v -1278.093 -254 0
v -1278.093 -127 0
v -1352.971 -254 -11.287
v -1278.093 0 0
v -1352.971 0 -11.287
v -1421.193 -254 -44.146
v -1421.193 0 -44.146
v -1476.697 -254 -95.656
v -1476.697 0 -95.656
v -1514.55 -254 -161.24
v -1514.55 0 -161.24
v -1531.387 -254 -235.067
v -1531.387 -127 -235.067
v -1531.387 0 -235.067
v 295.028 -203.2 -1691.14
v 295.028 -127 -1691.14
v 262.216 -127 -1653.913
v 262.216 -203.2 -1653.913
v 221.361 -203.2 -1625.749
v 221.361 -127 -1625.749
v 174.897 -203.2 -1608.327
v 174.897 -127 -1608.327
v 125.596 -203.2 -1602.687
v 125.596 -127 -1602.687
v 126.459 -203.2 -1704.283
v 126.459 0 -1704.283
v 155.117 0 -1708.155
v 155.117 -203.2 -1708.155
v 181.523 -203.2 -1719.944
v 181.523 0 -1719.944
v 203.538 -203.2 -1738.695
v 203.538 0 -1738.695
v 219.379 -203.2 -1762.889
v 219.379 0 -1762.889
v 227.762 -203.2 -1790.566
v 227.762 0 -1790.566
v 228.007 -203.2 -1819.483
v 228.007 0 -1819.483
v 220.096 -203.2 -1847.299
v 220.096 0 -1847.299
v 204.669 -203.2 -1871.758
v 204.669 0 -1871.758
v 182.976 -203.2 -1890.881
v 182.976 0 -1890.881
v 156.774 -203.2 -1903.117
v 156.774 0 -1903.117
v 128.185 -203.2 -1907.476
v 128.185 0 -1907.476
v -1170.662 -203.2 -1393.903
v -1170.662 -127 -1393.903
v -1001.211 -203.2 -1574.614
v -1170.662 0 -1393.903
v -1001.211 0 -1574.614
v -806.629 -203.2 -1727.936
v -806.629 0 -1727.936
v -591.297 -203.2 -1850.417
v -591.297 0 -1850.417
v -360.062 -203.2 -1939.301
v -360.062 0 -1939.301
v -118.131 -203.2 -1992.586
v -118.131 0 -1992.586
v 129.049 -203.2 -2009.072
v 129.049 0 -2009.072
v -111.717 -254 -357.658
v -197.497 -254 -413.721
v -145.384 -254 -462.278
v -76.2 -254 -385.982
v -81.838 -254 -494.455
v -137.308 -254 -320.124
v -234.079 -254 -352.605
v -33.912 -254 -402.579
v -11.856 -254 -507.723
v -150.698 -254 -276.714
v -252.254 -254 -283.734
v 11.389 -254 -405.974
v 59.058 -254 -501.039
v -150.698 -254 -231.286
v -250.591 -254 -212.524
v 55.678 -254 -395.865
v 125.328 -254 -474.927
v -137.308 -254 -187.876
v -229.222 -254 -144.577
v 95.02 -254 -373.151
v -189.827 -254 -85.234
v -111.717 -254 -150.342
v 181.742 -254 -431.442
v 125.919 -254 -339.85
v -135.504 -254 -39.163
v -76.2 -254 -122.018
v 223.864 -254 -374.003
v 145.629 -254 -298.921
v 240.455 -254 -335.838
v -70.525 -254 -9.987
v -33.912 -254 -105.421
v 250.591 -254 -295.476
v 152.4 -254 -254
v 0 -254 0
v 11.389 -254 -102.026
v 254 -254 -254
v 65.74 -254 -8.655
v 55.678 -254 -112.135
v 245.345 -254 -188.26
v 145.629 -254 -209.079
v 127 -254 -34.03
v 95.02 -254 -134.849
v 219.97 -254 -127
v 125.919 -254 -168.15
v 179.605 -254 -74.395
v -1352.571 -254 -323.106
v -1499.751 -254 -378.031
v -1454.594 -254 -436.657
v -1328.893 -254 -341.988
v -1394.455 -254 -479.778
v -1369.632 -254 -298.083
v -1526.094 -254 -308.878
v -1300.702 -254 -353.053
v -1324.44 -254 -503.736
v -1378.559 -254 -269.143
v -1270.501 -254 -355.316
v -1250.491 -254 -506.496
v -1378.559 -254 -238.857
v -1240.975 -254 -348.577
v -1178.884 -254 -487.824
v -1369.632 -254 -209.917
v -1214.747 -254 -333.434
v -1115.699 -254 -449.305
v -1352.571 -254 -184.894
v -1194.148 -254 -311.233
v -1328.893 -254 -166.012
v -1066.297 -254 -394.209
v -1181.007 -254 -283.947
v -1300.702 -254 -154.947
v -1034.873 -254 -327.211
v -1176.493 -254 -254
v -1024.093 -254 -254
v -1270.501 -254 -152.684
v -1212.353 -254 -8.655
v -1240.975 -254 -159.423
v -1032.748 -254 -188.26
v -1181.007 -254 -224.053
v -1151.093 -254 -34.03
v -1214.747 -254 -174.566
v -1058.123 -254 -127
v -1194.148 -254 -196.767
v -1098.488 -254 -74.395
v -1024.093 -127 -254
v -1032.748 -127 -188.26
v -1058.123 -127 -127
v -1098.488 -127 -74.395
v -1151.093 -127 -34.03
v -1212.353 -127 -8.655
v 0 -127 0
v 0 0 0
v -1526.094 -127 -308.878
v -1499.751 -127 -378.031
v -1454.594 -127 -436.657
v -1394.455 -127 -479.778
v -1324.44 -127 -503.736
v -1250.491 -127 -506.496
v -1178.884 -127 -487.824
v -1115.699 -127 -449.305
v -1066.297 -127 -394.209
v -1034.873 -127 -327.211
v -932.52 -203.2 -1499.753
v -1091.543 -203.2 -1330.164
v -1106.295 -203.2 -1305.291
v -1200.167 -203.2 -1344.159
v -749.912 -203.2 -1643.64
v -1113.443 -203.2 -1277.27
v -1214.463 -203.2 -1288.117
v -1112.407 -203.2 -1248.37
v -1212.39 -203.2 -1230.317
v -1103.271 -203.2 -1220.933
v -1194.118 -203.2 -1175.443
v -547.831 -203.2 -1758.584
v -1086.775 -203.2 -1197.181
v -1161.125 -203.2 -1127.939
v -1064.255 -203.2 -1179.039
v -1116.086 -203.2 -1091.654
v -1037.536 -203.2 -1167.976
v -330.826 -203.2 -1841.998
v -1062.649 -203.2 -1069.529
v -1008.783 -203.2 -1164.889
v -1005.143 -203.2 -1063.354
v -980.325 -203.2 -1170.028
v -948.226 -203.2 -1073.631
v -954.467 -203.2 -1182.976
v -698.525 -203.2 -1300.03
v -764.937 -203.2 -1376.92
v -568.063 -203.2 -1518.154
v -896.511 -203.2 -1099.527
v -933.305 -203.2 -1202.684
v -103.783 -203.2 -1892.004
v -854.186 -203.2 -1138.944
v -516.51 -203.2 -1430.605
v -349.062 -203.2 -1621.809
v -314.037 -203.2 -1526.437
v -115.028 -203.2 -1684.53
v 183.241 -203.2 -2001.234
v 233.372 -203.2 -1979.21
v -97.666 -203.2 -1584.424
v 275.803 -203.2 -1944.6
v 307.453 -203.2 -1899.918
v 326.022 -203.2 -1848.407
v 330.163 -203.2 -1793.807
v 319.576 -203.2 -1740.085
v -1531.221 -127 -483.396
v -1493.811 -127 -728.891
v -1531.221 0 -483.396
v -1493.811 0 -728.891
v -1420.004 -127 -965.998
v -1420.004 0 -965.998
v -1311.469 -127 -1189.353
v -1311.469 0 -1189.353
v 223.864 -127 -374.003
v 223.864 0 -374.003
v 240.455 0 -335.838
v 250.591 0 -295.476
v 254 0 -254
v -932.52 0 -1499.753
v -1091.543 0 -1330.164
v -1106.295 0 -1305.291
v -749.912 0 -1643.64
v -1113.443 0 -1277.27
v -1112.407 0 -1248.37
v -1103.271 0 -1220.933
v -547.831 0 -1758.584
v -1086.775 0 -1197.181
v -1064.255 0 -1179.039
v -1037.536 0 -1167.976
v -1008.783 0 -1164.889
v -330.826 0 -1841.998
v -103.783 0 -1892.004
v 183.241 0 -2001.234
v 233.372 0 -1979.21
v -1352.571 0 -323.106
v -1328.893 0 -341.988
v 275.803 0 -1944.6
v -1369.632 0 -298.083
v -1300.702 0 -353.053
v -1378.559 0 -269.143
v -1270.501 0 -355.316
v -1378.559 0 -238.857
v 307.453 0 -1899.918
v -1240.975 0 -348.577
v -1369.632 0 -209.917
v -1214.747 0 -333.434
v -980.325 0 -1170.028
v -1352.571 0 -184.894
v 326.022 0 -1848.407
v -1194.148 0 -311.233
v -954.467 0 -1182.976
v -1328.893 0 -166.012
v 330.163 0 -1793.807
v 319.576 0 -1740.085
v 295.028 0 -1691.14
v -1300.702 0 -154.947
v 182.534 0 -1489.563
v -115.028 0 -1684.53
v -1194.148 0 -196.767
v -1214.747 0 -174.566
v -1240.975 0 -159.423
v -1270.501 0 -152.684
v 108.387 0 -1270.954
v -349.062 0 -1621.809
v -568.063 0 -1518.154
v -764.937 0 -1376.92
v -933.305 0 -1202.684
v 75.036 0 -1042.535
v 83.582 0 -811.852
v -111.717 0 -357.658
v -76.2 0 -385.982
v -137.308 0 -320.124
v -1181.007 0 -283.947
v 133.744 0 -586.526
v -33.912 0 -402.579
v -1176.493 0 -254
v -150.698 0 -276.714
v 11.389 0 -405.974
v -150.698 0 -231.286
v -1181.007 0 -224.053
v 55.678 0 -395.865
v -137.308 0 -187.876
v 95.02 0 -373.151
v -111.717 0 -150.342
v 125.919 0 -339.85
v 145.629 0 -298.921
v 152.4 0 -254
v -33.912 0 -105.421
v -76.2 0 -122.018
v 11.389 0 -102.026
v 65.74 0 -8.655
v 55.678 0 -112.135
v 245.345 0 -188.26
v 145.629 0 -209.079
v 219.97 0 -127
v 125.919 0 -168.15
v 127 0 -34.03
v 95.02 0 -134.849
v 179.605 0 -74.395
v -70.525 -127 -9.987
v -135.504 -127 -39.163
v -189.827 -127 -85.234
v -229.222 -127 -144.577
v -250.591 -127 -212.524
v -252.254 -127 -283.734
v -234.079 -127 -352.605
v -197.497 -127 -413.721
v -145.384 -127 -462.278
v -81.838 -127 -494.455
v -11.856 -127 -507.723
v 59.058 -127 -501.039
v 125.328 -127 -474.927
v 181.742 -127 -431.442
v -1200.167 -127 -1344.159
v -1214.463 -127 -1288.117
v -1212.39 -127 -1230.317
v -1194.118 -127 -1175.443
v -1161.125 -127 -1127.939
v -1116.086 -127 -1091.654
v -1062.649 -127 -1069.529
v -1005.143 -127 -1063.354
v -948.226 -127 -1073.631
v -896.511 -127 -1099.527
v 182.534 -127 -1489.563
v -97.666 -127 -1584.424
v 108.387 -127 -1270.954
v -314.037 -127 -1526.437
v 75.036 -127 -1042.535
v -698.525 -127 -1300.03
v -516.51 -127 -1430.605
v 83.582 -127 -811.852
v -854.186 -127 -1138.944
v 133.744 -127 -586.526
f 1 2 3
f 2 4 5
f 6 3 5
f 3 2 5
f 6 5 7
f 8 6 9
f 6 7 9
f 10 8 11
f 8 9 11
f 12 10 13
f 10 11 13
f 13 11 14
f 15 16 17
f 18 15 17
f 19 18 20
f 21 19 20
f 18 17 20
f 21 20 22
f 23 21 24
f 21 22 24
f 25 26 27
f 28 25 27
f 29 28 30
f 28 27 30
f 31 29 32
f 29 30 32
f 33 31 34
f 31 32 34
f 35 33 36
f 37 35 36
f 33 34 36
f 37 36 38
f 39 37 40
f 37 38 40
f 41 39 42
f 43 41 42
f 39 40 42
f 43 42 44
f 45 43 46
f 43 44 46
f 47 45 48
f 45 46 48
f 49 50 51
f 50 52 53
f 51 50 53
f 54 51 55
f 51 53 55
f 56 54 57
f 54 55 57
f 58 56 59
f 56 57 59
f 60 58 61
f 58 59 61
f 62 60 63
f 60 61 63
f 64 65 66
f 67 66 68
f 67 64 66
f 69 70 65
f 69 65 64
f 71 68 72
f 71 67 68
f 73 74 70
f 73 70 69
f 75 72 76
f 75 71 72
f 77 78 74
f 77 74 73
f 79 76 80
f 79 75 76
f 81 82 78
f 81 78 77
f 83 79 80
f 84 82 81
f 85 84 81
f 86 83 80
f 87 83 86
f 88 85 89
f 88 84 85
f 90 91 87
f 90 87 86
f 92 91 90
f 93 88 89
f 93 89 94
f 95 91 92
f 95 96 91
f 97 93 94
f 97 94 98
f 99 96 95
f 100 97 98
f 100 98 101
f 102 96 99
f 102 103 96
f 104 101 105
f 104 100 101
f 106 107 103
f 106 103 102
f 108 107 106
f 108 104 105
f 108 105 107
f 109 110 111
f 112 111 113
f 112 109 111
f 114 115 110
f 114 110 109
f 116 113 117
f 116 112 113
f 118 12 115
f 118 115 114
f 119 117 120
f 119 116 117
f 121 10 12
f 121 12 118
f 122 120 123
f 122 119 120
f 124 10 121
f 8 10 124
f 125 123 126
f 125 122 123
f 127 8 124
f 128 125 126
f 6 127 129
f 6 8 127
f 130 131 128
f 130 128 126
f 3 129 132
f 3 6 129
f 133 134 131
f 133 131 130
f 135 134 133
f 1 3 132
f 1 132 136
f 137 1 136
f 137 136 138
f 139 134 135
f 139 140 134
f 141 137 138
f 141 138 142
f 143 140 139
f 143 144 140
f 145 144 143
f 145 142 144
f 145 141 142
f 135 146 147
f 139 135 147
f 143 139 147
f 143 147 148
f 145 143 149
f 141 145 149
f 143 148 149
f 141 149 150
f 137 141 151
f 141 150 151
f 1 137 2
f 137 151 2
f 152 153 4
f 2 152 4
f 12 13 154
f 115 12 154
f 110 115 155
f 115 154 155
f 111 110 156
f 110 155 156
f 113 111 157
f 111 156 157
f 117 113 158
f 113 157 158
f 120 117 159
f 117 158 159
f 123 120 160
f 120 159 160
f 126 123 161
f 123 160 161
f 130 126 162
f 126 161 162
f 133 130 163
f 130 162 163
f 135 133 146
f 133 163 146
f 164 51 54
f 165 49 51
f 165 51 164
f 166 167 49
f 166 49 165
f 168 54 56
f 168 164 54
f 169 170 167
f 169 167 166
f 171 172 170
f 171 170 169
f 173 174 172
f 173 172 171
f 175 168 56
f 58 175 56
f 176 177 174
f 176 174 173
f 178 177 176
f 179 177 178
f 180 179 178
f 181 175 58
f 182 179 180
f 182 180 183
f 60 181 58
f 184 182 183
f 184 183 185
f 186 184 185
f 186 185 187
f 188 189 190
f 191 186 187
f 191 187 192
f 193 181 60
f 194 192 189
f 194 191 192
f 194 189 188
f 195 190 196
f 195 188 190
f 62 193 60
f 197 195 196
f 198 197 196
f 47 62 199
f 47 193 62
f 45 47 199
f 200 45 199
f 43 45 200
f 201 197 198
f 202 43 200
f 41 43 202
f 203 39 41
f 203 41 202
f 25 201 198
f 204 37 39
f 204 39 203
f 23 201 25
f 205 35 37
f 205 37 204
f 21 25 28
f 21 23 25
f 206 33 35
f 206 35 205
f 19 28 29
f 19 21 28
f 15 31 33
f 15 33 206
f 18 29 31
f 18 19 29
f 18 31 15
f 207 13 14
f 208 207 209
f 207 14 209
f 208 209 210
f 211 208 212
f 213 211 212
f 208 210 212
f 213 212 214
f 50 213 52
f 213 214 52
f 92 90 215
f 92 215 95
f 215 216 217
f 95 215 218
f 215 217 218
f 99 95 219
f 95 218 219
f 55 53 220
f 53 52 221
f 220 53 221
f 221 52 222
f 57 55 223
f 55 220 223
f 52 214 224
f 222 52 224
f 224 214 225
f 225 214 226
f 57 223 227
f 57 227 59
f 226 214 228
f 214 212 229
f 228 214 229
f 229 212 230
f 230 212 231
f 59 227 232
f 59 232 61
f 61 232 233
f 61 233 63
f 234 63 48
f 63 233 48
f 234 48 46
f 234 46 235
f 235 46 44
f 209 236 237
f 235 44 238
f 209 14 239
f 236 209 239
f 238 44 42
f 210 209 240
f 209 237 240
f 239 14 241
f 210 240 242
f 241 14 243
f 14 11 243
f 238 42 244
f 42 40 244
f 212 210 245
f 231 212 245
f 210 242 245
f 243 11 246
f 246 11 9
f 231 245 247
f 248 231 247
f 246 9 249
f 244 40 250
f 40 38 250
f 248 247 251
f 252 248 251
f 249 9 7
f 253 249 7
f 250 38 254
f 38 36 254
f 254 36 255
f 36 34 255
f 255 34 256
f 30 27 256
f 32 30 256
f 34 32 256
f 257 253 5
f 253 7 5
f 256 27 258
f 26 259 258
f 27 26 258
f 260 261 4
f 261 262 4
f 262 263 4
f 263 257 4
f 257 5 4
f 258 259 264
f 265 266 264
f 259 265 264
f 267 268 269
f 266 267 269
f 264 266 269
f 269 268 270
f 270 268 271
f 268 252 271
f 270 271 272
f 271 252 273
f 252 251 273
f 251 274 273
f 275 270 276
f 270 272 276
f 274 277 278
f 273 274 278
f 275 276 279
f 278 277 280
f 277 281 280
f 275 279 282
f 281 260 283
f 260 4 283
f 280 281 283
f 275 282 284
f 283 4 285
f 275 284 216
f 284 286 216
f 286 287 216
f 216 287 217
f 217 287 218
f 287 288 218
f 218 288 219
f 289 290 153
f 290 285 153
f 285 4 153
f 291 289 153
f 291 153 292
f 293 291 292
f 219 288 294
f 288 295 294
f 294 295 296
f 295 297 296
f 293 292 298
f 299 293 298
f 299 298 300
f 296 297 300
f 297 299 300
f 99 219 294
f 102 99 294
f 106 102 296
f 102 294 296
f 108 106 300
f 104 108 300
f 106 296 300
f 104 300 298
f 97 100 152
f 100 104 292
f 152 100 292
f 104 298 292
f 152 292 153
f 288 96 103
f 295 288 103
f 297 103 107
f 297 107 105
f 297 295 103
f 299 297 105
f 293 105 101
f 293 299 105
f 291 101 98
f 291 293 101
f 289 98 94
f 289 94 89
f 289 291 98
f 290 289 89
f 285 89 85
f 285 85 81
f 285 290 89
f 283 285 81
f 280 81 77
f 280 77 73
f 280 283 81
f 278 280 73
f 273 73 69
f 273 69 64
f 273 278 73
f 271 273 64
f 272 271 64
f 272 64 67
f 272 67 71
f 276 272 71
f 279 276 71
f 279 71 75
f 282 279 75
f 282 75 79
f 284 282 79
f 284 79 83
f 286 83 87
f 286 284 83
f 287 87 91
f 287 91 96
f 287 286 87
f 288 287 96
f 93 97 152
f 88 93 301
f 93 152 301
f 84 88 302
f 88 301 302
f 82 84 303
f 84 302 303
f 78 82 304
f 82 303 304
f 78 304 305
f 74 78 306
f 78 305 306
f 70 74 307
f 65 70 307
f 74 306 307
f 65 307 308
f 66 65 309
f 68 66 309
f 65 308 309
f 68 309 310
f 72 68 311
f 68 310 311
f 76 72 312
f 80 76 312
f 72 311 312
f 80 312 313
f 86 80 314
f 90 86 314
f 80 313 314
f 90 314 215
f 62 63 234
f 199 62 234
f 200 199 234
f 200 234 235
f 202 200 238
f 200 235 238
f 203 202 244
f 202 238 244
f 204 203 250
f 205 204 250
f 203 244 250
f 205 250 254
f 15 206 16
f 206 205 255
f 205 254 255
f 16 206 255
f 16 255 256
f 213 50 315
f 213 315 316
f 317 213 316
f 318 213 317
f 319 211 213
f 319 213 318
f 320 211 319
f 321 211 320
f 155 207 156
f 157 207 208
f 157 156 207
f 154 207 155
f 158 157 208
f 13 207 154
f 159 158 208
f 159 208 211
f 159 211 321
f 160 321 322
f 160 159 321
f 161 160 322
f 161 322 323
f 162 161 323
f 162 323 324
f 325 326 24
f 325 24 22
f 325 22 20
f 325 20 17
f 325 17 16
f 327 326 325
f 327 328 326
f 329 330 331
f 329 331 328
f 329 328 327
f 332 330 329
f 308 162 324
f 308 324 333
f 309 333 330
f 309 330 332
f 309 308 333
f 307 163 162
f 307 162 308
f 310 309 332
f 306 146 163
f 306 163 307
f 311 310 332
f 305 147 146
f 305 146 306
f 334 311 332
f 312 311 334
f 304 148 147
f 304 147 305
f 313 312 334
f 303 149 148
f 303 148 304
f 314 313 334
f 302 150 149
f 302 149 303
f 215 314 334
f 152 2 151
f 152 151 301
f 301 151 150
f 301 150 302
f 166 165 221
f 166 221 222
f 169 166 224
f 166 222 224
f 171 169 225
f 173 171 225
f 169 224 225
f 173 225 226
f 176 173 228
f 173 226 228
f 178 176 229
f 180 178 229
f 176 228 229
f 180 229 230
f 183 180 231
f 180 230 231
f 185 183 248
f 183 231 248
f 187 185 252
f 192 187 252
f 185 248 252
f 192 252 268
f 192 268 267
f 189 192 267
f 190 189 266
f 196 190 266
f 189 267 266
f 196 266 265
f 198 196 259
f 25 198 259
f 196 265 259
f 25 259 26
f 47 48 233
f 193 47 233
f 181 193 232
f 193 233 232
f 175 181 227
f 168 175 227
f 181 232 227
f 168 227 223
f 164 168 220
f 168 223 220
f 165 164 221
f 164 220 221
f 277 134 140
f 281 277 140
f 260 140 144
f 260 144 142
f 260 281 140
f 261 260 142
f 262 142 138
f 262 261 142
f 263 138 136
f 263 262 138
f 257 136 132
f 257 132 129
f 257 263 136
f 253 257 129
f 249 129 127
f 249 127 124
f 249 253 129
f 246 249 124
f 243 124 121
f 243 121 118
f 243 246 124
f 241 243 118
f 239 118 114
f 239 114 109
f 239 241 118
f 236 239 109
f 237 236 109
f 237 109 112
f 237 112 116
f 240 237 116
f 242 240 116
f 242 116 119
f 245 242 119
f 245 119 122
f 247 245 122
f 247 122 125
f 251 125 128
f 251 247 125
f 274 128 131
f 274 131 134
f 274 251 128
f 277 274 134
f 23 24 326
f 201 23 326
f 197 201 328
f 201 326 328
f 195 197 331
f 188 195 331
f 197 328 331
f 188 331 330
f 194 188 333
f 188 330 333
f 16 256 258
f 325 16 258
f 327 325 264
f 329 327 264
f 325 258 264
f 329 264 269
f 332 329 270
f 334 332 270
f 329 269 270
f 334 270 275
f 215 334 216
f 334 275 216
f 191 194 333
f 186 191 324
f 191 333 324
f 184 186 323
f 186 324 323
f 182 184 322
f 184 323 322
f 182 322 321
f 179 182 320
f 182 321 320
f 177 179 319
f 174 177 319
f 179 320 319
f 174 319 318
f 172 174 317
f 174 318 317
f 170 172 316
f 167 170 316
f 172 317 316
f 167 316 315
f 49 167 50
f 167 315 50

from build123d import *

# Parameters (mm, degrees)
F1_DEPTH = 127
F2_DEPTH = 203.2
F0_R     = 101.6
F0_R_2   = 152.4
F3_DEPTH = 254


with BuildPart() as f1:
    # F0 (on Front) → F1 (new body)
    with BuildSketch(Plane.XZ):
        with BuildLine():
            ThreePointArc((223.864395, -374.003052), (-217.941248, -384.451571), (0, 0))
            Line((0, 0), (-1278.093423, 0))
            ThreePointArc((-1278.093423, 0), (-1098.488301, -74.394878), (-1024.093423, -254))
            ThreePointArc((-1024.093423, -254), (-1287.566511, -507.823286), (-1531.386814, -235.067006))
            ThreePointArc((-1531.386814, -235.067006), (-1461.371729, -848.834442), (-1170.661517, -1393.903384))
            ThreePointArc((-1170.661517, -1393.903384), (-1139.903384, -1108.186011), (-854.186011, -1138.944144))
            ThreePointArc((-854.186011, -1138.944144), (-417.434031, -1483.085525), (125.5956, -1602.686539))
            ThreePointArc((125.5956, -1602.686539), (221.360668, -1625.748682), (295.027596, -1691.139771))
            ThreePointArc((295.027596, -1691.139771), (75.035952, -1042.534849), (223.864395, -374.003052))
        make_face()
    extrude(amount=F1_DEPTH)

    # F0 (on Front) → F2 (join)
    with BuildSketch(Plane.XZ):
        with BuildLine():
            ThreePointArc((129.048784, -2009.071868), (307.452714, -1899.91768), (295.027596, -1691.139771))
            ThreePointArc((295.027596, -1691.139771), (221.360668, -1625.748682), (125.5956, -1602.686539))
            ThreePointArc((125.5956, -1602.686539), (-417.434031, -1483.085525), (-854.186011, -1138.944144))
            ThreePointArc((-854.186011, -1138.944144), (-1139.903384, -1108.186011), (-1170.661517, -1393.903384))
            ThreePointArc((-1170.661517, -1393.903384), (-591.296645, -1850.417461), (129.048784, -2009.071868))
        make_face()
        with BuildLine():
            ThreePointArc((126.458896, -1704.282872), (228.918524, -1805.015908), (128.185488, -1907.475536))
            ThreePointArc((128.185488, -1907.475536), (-547.830991, -1758.584477), (-1091.54264, -1330.163574))
            ThreePointArc((-1091.54264, -1330.163574), (-1076.163574, -1187.304888), (-933.304888, -1202.683954))
            ThreePointArc((-933.304888, -1202.683954), (-460.899684, -1574.918509), (126.458896, -1704.282872))
        make_face(mode=Mode.SUBTRACT)
    extrude(amount=F2_DEPTH)

    # F0 (on Front) → F3 (join)
    with BuildSketch(Plane.XZ):
        with BuildLine():
            ThreePointArc((-1024.093423, -254), (-1098.488301, -74.394878), (-1278.093423, 0))
            ThreePointArc((-1278.093423, 0), (-1450.875106, -67.821348), (-1531.386814, -235.067006))
            ThreePointArc((-1531.386814, -235.067006), (-1287.566511, -507.823286), (-1024.093423, -254))
        make_face()
        with Locations((-1278.093423, -254)):
            Circle(F0_R, mode=Mode.SUBTRACT)
        with BuildLine():
            ThreePointArc((254, -254), (179.605122, -74.394878), (0, 0))
            ThreePointArc((0, 0), (-217.941248, -384.451571), (223.864395, -374.003052))
            ThreePointArc((223.864395, -374.003052), (246.350925, -315.864544), (254, -254))
        make_face()
        with Locations((0, -254)):
            Circle(F0_R_2, mode=Mode.SUBTRACT)
    extrude(amount=F3_DEPTH)


solid = f1.part
